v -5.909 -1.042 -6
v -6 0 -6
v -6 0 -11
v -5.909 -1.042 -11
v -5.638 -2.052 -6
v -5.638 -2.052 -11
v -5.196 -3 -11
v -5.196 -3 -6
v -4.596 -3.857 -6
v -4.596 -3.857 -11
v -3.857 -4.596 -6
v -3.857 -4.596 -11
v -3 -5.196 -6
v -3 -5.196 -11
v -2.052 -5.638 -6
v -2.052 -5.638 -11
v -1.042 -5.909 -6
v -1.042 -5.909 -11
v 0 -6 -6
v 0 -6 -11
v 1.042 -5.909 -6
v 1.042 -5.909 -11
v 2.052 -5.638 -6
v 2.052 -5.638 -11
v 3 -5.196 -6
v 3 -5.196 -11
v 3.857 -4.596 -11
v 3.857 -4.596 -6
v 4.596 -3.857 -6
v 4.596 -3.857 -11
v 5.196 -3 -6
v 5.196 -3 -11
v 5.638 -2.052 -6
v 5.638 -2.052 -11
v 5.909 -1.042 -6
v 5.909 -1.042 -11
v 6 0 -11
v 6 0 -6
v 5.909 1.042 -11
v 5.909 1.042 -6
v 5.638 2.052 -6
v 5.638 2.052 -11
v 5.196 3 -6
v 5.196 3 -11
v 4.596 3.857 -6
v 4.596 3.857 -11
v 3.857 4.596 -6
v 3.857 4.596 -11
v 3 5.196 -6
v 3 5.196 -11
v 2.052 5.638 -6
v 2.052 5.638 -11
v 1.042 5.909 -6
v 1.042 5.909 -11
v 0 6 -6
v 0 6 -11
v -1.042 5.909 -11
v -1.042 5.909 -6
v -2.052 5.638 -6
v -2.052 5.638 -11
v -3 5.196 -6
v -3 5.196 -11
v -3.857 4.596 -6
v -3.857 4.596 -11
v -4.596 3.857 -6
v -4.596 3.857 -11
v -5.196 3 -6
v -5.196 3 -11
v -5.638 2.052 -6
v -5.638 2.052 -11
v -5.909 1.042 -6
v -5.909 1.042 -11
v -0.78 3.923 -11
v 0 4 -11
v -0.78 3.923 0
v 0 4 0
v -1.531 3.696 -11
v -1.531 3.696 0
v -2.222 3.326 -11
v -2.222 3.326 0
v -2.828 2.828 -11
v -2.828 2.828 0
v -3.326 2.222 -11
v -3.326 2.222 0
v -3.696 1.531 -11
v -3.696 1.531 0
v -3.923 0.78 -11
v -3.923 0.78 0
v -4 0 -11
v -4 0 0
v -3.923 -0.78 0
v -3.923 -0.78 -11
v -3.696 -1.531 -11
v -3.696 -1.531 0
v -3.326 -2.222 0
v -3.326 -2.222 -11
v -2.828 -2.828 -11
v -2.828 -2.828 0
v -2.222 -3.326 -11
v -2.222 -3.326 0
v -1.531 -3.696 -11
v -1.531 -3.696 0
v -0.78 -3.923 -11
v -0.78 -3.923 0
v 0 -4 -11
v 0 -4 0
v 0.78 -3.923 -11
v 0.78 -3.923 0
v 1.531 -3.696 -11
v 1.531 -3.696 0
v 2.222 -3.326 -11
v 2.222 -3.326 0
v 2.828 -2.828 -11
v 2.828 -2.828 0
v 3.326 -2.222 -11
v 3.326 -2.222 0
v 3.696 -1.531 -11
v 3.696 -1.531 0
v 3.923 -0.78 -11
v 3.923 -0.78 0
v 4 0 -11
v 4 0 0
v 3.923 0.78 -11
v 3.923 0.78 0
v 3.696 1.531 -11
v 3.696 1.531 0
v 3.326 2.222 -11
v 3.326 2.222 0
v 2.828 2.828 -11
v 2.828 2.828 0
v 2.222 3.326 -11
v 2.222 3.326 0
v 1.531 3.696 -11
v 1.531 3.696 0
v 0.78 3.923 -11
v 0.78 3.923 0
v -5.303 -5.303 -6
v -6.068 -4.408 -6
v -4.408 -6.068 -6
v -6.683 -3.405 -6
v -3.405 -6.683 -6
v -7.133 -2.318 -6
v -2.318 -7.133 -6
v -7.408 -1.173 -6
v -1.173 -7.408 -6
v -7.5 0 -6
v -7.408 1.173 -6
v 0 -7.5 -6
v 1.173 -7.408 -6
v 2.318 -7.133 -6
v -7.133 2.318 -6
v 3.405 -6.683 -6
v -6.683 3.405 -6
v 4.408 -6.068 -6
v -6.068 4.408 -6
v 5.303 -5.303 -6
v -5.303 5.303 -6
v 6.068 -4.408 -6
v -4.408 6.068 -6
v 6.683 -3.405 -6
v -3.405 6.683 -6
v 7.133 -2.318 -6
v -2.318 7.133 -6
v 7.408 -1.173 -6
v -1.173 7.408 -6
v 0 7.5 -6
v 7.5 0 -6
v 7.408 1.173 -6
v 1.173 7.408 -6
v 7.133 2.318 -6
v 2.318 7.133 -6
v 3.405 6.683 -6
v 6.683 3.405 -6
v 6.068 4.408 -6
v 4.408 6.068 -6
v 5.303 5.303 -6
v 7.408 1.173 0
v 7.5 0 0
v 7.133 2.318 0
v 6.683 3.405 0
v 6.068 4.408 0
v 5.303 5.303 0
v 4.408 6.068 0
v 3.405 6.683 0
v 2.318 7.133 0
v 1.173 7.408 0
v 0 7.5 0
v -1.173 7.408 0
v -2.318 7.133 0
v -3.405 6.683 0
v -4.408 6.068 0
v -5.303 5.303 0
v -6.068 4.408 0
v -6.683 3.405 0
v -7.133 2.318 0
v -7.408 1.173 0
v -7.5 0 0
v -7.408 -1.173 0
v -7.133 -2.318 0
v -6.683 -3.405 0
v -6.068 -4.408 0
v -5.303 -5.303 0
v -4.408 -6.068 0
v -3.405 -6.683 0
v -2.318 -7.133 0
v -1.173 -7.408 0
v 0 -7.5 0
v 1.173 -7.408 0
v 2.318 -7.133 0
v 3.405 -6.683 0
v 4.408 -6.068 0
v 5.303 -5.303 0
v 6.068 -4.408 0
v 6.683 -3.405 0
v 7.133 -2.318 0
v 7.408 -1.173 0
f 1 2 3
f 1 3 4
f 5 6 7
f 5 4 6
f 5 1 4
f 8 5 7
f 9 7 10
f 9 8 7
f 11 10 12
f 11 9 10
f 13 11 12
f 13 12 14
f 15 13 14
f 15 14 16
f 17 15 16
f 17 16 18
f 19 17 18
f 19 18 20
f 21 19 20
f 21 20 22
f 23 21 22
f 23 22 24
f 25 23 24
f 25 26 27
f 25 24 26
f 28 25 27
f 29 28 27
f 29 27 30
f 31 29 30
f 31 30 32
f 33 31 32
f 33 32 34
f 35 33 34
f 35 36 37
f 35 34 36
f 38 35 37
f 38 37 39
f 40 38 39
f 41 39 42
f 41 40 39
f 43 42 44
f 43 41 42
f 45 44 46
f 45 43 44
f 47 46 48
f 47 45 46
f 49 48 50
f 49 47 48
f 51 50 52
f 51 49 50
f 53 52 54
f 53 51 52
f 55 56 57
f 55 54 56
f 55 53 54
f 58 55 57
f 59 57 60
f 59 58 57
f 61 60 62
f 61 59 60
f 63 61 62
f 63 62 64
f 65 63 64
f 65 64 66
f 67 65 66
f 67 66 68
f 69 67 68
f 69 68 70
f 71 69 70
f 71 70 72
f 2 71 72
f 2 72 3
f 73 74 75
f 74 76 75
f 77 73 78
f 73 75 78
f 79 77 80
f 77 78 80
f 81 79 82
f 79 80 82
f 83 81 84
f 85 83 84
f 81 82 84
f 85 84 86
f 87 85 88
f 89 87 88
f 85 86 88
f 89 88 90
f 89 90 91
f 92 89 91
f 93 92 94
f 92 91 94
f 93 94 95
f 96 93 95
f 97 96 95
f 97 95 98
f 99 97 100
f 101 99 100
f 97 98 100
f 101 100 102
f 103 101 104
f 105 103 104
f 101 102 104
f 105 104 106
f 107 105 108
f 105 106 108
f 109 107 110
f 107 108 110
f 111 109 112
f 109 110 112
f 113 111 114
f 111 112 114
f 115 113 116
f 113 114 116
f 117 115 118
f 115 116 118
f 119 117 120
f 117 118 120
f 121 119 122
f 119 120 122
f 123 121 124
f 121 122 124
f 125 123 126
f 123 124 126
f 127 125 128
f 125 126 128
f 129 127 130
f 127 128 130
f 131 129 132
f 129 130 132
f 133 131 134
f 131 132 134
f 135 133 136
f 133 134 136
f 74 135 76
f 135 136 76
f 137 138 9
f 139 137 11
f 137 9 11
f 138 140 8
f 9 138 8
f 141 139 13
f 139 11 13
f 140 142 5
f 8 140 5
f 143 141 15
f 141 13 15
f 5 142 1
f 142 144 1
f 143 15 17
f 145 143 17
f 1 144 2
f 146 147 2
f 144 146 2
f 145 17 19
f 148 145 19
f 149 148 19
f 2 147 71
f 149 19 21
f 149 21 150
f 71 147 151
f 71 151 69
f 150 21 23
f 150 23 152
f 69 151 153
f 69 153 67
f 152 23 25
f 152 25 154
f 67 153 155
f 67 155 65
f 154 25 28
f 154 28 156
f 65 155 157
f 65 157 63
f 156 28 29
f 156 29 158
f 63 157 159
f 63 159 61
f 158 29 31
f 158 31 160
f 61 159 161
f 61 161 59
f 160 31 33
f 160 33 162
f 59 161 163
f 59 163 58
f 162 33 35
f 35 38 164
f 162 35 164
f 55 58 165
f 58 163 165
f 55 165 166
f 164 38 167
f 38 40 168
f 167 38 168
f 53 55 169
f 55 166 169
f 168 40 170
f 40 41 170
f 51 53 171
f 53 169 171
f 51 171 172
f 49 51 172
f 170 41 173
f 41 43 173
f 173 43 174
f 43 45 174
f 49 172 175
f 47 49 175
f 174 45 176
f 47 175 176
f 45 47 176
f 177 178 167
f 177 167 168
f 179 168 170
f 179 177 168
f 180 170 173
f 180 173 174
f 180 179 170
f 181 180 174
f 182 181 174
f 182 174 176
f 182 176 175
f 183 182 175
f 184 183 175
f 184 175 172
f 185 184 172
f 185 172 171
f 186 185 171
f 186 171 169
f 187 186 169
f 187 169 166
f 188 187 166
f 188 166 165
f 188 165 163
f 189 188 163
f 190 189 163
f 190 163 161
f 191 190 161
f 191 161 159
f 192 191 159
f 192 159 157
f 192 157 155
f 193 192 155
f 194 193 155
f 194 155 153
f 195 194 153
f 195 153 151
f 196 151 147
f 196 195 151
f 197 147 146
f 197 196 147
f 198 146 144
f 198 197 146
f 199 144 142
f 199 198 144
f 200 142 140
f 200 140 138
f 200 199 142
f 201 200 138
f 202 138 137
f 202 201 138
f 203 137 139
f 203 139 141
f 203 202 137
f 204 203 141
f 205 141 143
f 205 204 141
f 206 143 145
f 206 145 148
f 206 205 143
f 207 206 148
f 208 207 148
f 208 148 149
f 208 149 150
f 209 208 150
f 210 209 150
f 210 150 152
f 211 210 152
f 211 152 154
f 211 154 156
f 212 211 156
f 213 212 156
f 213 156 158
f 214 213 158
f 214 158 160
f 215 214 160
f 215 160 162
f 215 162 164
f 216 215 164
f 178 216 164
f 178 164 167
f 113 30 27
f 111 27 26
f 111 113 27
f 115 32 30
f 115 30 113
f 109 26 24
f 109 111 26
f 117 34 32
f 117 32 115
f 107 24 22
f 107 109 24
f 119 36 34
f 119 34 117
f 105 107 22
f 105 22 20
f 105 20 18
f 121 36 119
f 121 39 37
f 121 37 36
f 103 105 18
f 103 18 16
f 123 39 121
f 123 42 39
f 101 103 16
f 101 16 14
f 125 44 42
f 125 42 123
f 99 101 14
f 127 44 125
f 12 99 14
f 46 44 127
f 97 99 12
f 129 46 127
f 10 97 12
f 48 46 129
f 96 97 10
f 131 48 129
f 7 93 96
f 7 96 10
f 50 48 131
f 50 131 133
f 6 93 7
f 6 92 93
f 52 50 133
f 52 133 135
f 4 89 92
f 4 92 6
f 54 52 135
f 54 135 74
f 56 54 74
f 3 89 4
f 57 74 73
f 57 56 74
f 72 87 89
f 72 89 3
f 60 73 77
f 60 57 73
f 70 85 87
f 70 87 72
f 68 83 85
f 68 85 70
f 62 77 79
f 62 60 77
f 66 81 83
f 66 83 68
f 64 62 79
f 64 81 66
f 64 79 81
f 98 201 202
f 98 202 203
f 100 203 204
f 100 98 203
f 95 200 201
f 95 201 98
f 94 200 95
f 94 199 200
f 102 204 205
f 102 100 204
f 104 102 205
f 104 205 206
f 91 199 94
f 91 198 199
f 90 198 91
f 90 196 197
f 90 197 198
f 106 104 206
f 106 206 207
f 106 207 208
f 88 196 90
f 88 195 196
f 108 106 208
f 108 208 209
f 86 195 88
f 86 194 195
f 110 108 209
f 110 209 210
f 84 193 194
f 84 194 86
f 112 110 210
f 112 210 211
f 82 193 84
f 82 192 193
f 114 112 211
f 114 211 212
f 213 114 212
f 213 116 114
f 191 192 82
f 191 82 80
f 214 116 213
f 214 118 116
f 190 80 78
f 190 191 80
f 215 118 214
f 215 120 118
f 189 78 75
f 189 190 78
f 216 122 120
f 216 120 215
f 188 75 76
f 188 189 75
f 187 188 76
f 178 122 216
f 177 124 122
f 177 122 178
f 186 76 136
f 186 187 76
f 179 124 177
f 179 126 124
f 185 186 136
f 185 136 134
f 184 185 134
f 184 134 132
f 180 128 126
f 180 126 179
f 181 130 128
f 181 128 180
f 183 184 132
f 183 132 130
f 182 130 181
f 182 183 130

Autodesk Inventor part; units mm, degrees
ref_plane "YZ Plane" through (0, 0, 0) normal (1, 0, 0) x (0, 1, 0)
ref_plane "XZ Plane" through (0, 0, 0) normal (0, 1, 0) x (-1, 0, 0)
ref_plane "XY Plane" through (0, 0, 0) normal (0, 0, 1) x (1, 0, 0)
sketch "Sketch1" plane through (0, 0, 0) normal (0, 0, 1) x (1, 0, 0)
  circle A0 centre (0, 0) radius 7.5
  dimension "d0" = 15
extrude "Extrusion1" add sketch "Sketch1" against normal blind 6
sketch "Sketch2" plane through (0, 0, -6) normal (0, 0, -1) x (-1, 0, 0)
  circle A0 centre (0, 0) radius 6
  dimension "d3" = 12
extrude "Extrusion2" add sketch "Sketch2" along normal blind 5
sketch "Sketch3" plane through (0, 0, -11) normal (0, 0, -1) x (-1, 0, 0)
  circle A0 centre (0, 0) radius 6 projected
hole "Hole1" at (0, 0, -11) direction (0, 0, 1) diameter 8 depth 11
thread "Thread1" size "M8x1.25" class "6H" standard "ISO Metric profile" length 15
properties part number "117" material "Aluminum 6061"
